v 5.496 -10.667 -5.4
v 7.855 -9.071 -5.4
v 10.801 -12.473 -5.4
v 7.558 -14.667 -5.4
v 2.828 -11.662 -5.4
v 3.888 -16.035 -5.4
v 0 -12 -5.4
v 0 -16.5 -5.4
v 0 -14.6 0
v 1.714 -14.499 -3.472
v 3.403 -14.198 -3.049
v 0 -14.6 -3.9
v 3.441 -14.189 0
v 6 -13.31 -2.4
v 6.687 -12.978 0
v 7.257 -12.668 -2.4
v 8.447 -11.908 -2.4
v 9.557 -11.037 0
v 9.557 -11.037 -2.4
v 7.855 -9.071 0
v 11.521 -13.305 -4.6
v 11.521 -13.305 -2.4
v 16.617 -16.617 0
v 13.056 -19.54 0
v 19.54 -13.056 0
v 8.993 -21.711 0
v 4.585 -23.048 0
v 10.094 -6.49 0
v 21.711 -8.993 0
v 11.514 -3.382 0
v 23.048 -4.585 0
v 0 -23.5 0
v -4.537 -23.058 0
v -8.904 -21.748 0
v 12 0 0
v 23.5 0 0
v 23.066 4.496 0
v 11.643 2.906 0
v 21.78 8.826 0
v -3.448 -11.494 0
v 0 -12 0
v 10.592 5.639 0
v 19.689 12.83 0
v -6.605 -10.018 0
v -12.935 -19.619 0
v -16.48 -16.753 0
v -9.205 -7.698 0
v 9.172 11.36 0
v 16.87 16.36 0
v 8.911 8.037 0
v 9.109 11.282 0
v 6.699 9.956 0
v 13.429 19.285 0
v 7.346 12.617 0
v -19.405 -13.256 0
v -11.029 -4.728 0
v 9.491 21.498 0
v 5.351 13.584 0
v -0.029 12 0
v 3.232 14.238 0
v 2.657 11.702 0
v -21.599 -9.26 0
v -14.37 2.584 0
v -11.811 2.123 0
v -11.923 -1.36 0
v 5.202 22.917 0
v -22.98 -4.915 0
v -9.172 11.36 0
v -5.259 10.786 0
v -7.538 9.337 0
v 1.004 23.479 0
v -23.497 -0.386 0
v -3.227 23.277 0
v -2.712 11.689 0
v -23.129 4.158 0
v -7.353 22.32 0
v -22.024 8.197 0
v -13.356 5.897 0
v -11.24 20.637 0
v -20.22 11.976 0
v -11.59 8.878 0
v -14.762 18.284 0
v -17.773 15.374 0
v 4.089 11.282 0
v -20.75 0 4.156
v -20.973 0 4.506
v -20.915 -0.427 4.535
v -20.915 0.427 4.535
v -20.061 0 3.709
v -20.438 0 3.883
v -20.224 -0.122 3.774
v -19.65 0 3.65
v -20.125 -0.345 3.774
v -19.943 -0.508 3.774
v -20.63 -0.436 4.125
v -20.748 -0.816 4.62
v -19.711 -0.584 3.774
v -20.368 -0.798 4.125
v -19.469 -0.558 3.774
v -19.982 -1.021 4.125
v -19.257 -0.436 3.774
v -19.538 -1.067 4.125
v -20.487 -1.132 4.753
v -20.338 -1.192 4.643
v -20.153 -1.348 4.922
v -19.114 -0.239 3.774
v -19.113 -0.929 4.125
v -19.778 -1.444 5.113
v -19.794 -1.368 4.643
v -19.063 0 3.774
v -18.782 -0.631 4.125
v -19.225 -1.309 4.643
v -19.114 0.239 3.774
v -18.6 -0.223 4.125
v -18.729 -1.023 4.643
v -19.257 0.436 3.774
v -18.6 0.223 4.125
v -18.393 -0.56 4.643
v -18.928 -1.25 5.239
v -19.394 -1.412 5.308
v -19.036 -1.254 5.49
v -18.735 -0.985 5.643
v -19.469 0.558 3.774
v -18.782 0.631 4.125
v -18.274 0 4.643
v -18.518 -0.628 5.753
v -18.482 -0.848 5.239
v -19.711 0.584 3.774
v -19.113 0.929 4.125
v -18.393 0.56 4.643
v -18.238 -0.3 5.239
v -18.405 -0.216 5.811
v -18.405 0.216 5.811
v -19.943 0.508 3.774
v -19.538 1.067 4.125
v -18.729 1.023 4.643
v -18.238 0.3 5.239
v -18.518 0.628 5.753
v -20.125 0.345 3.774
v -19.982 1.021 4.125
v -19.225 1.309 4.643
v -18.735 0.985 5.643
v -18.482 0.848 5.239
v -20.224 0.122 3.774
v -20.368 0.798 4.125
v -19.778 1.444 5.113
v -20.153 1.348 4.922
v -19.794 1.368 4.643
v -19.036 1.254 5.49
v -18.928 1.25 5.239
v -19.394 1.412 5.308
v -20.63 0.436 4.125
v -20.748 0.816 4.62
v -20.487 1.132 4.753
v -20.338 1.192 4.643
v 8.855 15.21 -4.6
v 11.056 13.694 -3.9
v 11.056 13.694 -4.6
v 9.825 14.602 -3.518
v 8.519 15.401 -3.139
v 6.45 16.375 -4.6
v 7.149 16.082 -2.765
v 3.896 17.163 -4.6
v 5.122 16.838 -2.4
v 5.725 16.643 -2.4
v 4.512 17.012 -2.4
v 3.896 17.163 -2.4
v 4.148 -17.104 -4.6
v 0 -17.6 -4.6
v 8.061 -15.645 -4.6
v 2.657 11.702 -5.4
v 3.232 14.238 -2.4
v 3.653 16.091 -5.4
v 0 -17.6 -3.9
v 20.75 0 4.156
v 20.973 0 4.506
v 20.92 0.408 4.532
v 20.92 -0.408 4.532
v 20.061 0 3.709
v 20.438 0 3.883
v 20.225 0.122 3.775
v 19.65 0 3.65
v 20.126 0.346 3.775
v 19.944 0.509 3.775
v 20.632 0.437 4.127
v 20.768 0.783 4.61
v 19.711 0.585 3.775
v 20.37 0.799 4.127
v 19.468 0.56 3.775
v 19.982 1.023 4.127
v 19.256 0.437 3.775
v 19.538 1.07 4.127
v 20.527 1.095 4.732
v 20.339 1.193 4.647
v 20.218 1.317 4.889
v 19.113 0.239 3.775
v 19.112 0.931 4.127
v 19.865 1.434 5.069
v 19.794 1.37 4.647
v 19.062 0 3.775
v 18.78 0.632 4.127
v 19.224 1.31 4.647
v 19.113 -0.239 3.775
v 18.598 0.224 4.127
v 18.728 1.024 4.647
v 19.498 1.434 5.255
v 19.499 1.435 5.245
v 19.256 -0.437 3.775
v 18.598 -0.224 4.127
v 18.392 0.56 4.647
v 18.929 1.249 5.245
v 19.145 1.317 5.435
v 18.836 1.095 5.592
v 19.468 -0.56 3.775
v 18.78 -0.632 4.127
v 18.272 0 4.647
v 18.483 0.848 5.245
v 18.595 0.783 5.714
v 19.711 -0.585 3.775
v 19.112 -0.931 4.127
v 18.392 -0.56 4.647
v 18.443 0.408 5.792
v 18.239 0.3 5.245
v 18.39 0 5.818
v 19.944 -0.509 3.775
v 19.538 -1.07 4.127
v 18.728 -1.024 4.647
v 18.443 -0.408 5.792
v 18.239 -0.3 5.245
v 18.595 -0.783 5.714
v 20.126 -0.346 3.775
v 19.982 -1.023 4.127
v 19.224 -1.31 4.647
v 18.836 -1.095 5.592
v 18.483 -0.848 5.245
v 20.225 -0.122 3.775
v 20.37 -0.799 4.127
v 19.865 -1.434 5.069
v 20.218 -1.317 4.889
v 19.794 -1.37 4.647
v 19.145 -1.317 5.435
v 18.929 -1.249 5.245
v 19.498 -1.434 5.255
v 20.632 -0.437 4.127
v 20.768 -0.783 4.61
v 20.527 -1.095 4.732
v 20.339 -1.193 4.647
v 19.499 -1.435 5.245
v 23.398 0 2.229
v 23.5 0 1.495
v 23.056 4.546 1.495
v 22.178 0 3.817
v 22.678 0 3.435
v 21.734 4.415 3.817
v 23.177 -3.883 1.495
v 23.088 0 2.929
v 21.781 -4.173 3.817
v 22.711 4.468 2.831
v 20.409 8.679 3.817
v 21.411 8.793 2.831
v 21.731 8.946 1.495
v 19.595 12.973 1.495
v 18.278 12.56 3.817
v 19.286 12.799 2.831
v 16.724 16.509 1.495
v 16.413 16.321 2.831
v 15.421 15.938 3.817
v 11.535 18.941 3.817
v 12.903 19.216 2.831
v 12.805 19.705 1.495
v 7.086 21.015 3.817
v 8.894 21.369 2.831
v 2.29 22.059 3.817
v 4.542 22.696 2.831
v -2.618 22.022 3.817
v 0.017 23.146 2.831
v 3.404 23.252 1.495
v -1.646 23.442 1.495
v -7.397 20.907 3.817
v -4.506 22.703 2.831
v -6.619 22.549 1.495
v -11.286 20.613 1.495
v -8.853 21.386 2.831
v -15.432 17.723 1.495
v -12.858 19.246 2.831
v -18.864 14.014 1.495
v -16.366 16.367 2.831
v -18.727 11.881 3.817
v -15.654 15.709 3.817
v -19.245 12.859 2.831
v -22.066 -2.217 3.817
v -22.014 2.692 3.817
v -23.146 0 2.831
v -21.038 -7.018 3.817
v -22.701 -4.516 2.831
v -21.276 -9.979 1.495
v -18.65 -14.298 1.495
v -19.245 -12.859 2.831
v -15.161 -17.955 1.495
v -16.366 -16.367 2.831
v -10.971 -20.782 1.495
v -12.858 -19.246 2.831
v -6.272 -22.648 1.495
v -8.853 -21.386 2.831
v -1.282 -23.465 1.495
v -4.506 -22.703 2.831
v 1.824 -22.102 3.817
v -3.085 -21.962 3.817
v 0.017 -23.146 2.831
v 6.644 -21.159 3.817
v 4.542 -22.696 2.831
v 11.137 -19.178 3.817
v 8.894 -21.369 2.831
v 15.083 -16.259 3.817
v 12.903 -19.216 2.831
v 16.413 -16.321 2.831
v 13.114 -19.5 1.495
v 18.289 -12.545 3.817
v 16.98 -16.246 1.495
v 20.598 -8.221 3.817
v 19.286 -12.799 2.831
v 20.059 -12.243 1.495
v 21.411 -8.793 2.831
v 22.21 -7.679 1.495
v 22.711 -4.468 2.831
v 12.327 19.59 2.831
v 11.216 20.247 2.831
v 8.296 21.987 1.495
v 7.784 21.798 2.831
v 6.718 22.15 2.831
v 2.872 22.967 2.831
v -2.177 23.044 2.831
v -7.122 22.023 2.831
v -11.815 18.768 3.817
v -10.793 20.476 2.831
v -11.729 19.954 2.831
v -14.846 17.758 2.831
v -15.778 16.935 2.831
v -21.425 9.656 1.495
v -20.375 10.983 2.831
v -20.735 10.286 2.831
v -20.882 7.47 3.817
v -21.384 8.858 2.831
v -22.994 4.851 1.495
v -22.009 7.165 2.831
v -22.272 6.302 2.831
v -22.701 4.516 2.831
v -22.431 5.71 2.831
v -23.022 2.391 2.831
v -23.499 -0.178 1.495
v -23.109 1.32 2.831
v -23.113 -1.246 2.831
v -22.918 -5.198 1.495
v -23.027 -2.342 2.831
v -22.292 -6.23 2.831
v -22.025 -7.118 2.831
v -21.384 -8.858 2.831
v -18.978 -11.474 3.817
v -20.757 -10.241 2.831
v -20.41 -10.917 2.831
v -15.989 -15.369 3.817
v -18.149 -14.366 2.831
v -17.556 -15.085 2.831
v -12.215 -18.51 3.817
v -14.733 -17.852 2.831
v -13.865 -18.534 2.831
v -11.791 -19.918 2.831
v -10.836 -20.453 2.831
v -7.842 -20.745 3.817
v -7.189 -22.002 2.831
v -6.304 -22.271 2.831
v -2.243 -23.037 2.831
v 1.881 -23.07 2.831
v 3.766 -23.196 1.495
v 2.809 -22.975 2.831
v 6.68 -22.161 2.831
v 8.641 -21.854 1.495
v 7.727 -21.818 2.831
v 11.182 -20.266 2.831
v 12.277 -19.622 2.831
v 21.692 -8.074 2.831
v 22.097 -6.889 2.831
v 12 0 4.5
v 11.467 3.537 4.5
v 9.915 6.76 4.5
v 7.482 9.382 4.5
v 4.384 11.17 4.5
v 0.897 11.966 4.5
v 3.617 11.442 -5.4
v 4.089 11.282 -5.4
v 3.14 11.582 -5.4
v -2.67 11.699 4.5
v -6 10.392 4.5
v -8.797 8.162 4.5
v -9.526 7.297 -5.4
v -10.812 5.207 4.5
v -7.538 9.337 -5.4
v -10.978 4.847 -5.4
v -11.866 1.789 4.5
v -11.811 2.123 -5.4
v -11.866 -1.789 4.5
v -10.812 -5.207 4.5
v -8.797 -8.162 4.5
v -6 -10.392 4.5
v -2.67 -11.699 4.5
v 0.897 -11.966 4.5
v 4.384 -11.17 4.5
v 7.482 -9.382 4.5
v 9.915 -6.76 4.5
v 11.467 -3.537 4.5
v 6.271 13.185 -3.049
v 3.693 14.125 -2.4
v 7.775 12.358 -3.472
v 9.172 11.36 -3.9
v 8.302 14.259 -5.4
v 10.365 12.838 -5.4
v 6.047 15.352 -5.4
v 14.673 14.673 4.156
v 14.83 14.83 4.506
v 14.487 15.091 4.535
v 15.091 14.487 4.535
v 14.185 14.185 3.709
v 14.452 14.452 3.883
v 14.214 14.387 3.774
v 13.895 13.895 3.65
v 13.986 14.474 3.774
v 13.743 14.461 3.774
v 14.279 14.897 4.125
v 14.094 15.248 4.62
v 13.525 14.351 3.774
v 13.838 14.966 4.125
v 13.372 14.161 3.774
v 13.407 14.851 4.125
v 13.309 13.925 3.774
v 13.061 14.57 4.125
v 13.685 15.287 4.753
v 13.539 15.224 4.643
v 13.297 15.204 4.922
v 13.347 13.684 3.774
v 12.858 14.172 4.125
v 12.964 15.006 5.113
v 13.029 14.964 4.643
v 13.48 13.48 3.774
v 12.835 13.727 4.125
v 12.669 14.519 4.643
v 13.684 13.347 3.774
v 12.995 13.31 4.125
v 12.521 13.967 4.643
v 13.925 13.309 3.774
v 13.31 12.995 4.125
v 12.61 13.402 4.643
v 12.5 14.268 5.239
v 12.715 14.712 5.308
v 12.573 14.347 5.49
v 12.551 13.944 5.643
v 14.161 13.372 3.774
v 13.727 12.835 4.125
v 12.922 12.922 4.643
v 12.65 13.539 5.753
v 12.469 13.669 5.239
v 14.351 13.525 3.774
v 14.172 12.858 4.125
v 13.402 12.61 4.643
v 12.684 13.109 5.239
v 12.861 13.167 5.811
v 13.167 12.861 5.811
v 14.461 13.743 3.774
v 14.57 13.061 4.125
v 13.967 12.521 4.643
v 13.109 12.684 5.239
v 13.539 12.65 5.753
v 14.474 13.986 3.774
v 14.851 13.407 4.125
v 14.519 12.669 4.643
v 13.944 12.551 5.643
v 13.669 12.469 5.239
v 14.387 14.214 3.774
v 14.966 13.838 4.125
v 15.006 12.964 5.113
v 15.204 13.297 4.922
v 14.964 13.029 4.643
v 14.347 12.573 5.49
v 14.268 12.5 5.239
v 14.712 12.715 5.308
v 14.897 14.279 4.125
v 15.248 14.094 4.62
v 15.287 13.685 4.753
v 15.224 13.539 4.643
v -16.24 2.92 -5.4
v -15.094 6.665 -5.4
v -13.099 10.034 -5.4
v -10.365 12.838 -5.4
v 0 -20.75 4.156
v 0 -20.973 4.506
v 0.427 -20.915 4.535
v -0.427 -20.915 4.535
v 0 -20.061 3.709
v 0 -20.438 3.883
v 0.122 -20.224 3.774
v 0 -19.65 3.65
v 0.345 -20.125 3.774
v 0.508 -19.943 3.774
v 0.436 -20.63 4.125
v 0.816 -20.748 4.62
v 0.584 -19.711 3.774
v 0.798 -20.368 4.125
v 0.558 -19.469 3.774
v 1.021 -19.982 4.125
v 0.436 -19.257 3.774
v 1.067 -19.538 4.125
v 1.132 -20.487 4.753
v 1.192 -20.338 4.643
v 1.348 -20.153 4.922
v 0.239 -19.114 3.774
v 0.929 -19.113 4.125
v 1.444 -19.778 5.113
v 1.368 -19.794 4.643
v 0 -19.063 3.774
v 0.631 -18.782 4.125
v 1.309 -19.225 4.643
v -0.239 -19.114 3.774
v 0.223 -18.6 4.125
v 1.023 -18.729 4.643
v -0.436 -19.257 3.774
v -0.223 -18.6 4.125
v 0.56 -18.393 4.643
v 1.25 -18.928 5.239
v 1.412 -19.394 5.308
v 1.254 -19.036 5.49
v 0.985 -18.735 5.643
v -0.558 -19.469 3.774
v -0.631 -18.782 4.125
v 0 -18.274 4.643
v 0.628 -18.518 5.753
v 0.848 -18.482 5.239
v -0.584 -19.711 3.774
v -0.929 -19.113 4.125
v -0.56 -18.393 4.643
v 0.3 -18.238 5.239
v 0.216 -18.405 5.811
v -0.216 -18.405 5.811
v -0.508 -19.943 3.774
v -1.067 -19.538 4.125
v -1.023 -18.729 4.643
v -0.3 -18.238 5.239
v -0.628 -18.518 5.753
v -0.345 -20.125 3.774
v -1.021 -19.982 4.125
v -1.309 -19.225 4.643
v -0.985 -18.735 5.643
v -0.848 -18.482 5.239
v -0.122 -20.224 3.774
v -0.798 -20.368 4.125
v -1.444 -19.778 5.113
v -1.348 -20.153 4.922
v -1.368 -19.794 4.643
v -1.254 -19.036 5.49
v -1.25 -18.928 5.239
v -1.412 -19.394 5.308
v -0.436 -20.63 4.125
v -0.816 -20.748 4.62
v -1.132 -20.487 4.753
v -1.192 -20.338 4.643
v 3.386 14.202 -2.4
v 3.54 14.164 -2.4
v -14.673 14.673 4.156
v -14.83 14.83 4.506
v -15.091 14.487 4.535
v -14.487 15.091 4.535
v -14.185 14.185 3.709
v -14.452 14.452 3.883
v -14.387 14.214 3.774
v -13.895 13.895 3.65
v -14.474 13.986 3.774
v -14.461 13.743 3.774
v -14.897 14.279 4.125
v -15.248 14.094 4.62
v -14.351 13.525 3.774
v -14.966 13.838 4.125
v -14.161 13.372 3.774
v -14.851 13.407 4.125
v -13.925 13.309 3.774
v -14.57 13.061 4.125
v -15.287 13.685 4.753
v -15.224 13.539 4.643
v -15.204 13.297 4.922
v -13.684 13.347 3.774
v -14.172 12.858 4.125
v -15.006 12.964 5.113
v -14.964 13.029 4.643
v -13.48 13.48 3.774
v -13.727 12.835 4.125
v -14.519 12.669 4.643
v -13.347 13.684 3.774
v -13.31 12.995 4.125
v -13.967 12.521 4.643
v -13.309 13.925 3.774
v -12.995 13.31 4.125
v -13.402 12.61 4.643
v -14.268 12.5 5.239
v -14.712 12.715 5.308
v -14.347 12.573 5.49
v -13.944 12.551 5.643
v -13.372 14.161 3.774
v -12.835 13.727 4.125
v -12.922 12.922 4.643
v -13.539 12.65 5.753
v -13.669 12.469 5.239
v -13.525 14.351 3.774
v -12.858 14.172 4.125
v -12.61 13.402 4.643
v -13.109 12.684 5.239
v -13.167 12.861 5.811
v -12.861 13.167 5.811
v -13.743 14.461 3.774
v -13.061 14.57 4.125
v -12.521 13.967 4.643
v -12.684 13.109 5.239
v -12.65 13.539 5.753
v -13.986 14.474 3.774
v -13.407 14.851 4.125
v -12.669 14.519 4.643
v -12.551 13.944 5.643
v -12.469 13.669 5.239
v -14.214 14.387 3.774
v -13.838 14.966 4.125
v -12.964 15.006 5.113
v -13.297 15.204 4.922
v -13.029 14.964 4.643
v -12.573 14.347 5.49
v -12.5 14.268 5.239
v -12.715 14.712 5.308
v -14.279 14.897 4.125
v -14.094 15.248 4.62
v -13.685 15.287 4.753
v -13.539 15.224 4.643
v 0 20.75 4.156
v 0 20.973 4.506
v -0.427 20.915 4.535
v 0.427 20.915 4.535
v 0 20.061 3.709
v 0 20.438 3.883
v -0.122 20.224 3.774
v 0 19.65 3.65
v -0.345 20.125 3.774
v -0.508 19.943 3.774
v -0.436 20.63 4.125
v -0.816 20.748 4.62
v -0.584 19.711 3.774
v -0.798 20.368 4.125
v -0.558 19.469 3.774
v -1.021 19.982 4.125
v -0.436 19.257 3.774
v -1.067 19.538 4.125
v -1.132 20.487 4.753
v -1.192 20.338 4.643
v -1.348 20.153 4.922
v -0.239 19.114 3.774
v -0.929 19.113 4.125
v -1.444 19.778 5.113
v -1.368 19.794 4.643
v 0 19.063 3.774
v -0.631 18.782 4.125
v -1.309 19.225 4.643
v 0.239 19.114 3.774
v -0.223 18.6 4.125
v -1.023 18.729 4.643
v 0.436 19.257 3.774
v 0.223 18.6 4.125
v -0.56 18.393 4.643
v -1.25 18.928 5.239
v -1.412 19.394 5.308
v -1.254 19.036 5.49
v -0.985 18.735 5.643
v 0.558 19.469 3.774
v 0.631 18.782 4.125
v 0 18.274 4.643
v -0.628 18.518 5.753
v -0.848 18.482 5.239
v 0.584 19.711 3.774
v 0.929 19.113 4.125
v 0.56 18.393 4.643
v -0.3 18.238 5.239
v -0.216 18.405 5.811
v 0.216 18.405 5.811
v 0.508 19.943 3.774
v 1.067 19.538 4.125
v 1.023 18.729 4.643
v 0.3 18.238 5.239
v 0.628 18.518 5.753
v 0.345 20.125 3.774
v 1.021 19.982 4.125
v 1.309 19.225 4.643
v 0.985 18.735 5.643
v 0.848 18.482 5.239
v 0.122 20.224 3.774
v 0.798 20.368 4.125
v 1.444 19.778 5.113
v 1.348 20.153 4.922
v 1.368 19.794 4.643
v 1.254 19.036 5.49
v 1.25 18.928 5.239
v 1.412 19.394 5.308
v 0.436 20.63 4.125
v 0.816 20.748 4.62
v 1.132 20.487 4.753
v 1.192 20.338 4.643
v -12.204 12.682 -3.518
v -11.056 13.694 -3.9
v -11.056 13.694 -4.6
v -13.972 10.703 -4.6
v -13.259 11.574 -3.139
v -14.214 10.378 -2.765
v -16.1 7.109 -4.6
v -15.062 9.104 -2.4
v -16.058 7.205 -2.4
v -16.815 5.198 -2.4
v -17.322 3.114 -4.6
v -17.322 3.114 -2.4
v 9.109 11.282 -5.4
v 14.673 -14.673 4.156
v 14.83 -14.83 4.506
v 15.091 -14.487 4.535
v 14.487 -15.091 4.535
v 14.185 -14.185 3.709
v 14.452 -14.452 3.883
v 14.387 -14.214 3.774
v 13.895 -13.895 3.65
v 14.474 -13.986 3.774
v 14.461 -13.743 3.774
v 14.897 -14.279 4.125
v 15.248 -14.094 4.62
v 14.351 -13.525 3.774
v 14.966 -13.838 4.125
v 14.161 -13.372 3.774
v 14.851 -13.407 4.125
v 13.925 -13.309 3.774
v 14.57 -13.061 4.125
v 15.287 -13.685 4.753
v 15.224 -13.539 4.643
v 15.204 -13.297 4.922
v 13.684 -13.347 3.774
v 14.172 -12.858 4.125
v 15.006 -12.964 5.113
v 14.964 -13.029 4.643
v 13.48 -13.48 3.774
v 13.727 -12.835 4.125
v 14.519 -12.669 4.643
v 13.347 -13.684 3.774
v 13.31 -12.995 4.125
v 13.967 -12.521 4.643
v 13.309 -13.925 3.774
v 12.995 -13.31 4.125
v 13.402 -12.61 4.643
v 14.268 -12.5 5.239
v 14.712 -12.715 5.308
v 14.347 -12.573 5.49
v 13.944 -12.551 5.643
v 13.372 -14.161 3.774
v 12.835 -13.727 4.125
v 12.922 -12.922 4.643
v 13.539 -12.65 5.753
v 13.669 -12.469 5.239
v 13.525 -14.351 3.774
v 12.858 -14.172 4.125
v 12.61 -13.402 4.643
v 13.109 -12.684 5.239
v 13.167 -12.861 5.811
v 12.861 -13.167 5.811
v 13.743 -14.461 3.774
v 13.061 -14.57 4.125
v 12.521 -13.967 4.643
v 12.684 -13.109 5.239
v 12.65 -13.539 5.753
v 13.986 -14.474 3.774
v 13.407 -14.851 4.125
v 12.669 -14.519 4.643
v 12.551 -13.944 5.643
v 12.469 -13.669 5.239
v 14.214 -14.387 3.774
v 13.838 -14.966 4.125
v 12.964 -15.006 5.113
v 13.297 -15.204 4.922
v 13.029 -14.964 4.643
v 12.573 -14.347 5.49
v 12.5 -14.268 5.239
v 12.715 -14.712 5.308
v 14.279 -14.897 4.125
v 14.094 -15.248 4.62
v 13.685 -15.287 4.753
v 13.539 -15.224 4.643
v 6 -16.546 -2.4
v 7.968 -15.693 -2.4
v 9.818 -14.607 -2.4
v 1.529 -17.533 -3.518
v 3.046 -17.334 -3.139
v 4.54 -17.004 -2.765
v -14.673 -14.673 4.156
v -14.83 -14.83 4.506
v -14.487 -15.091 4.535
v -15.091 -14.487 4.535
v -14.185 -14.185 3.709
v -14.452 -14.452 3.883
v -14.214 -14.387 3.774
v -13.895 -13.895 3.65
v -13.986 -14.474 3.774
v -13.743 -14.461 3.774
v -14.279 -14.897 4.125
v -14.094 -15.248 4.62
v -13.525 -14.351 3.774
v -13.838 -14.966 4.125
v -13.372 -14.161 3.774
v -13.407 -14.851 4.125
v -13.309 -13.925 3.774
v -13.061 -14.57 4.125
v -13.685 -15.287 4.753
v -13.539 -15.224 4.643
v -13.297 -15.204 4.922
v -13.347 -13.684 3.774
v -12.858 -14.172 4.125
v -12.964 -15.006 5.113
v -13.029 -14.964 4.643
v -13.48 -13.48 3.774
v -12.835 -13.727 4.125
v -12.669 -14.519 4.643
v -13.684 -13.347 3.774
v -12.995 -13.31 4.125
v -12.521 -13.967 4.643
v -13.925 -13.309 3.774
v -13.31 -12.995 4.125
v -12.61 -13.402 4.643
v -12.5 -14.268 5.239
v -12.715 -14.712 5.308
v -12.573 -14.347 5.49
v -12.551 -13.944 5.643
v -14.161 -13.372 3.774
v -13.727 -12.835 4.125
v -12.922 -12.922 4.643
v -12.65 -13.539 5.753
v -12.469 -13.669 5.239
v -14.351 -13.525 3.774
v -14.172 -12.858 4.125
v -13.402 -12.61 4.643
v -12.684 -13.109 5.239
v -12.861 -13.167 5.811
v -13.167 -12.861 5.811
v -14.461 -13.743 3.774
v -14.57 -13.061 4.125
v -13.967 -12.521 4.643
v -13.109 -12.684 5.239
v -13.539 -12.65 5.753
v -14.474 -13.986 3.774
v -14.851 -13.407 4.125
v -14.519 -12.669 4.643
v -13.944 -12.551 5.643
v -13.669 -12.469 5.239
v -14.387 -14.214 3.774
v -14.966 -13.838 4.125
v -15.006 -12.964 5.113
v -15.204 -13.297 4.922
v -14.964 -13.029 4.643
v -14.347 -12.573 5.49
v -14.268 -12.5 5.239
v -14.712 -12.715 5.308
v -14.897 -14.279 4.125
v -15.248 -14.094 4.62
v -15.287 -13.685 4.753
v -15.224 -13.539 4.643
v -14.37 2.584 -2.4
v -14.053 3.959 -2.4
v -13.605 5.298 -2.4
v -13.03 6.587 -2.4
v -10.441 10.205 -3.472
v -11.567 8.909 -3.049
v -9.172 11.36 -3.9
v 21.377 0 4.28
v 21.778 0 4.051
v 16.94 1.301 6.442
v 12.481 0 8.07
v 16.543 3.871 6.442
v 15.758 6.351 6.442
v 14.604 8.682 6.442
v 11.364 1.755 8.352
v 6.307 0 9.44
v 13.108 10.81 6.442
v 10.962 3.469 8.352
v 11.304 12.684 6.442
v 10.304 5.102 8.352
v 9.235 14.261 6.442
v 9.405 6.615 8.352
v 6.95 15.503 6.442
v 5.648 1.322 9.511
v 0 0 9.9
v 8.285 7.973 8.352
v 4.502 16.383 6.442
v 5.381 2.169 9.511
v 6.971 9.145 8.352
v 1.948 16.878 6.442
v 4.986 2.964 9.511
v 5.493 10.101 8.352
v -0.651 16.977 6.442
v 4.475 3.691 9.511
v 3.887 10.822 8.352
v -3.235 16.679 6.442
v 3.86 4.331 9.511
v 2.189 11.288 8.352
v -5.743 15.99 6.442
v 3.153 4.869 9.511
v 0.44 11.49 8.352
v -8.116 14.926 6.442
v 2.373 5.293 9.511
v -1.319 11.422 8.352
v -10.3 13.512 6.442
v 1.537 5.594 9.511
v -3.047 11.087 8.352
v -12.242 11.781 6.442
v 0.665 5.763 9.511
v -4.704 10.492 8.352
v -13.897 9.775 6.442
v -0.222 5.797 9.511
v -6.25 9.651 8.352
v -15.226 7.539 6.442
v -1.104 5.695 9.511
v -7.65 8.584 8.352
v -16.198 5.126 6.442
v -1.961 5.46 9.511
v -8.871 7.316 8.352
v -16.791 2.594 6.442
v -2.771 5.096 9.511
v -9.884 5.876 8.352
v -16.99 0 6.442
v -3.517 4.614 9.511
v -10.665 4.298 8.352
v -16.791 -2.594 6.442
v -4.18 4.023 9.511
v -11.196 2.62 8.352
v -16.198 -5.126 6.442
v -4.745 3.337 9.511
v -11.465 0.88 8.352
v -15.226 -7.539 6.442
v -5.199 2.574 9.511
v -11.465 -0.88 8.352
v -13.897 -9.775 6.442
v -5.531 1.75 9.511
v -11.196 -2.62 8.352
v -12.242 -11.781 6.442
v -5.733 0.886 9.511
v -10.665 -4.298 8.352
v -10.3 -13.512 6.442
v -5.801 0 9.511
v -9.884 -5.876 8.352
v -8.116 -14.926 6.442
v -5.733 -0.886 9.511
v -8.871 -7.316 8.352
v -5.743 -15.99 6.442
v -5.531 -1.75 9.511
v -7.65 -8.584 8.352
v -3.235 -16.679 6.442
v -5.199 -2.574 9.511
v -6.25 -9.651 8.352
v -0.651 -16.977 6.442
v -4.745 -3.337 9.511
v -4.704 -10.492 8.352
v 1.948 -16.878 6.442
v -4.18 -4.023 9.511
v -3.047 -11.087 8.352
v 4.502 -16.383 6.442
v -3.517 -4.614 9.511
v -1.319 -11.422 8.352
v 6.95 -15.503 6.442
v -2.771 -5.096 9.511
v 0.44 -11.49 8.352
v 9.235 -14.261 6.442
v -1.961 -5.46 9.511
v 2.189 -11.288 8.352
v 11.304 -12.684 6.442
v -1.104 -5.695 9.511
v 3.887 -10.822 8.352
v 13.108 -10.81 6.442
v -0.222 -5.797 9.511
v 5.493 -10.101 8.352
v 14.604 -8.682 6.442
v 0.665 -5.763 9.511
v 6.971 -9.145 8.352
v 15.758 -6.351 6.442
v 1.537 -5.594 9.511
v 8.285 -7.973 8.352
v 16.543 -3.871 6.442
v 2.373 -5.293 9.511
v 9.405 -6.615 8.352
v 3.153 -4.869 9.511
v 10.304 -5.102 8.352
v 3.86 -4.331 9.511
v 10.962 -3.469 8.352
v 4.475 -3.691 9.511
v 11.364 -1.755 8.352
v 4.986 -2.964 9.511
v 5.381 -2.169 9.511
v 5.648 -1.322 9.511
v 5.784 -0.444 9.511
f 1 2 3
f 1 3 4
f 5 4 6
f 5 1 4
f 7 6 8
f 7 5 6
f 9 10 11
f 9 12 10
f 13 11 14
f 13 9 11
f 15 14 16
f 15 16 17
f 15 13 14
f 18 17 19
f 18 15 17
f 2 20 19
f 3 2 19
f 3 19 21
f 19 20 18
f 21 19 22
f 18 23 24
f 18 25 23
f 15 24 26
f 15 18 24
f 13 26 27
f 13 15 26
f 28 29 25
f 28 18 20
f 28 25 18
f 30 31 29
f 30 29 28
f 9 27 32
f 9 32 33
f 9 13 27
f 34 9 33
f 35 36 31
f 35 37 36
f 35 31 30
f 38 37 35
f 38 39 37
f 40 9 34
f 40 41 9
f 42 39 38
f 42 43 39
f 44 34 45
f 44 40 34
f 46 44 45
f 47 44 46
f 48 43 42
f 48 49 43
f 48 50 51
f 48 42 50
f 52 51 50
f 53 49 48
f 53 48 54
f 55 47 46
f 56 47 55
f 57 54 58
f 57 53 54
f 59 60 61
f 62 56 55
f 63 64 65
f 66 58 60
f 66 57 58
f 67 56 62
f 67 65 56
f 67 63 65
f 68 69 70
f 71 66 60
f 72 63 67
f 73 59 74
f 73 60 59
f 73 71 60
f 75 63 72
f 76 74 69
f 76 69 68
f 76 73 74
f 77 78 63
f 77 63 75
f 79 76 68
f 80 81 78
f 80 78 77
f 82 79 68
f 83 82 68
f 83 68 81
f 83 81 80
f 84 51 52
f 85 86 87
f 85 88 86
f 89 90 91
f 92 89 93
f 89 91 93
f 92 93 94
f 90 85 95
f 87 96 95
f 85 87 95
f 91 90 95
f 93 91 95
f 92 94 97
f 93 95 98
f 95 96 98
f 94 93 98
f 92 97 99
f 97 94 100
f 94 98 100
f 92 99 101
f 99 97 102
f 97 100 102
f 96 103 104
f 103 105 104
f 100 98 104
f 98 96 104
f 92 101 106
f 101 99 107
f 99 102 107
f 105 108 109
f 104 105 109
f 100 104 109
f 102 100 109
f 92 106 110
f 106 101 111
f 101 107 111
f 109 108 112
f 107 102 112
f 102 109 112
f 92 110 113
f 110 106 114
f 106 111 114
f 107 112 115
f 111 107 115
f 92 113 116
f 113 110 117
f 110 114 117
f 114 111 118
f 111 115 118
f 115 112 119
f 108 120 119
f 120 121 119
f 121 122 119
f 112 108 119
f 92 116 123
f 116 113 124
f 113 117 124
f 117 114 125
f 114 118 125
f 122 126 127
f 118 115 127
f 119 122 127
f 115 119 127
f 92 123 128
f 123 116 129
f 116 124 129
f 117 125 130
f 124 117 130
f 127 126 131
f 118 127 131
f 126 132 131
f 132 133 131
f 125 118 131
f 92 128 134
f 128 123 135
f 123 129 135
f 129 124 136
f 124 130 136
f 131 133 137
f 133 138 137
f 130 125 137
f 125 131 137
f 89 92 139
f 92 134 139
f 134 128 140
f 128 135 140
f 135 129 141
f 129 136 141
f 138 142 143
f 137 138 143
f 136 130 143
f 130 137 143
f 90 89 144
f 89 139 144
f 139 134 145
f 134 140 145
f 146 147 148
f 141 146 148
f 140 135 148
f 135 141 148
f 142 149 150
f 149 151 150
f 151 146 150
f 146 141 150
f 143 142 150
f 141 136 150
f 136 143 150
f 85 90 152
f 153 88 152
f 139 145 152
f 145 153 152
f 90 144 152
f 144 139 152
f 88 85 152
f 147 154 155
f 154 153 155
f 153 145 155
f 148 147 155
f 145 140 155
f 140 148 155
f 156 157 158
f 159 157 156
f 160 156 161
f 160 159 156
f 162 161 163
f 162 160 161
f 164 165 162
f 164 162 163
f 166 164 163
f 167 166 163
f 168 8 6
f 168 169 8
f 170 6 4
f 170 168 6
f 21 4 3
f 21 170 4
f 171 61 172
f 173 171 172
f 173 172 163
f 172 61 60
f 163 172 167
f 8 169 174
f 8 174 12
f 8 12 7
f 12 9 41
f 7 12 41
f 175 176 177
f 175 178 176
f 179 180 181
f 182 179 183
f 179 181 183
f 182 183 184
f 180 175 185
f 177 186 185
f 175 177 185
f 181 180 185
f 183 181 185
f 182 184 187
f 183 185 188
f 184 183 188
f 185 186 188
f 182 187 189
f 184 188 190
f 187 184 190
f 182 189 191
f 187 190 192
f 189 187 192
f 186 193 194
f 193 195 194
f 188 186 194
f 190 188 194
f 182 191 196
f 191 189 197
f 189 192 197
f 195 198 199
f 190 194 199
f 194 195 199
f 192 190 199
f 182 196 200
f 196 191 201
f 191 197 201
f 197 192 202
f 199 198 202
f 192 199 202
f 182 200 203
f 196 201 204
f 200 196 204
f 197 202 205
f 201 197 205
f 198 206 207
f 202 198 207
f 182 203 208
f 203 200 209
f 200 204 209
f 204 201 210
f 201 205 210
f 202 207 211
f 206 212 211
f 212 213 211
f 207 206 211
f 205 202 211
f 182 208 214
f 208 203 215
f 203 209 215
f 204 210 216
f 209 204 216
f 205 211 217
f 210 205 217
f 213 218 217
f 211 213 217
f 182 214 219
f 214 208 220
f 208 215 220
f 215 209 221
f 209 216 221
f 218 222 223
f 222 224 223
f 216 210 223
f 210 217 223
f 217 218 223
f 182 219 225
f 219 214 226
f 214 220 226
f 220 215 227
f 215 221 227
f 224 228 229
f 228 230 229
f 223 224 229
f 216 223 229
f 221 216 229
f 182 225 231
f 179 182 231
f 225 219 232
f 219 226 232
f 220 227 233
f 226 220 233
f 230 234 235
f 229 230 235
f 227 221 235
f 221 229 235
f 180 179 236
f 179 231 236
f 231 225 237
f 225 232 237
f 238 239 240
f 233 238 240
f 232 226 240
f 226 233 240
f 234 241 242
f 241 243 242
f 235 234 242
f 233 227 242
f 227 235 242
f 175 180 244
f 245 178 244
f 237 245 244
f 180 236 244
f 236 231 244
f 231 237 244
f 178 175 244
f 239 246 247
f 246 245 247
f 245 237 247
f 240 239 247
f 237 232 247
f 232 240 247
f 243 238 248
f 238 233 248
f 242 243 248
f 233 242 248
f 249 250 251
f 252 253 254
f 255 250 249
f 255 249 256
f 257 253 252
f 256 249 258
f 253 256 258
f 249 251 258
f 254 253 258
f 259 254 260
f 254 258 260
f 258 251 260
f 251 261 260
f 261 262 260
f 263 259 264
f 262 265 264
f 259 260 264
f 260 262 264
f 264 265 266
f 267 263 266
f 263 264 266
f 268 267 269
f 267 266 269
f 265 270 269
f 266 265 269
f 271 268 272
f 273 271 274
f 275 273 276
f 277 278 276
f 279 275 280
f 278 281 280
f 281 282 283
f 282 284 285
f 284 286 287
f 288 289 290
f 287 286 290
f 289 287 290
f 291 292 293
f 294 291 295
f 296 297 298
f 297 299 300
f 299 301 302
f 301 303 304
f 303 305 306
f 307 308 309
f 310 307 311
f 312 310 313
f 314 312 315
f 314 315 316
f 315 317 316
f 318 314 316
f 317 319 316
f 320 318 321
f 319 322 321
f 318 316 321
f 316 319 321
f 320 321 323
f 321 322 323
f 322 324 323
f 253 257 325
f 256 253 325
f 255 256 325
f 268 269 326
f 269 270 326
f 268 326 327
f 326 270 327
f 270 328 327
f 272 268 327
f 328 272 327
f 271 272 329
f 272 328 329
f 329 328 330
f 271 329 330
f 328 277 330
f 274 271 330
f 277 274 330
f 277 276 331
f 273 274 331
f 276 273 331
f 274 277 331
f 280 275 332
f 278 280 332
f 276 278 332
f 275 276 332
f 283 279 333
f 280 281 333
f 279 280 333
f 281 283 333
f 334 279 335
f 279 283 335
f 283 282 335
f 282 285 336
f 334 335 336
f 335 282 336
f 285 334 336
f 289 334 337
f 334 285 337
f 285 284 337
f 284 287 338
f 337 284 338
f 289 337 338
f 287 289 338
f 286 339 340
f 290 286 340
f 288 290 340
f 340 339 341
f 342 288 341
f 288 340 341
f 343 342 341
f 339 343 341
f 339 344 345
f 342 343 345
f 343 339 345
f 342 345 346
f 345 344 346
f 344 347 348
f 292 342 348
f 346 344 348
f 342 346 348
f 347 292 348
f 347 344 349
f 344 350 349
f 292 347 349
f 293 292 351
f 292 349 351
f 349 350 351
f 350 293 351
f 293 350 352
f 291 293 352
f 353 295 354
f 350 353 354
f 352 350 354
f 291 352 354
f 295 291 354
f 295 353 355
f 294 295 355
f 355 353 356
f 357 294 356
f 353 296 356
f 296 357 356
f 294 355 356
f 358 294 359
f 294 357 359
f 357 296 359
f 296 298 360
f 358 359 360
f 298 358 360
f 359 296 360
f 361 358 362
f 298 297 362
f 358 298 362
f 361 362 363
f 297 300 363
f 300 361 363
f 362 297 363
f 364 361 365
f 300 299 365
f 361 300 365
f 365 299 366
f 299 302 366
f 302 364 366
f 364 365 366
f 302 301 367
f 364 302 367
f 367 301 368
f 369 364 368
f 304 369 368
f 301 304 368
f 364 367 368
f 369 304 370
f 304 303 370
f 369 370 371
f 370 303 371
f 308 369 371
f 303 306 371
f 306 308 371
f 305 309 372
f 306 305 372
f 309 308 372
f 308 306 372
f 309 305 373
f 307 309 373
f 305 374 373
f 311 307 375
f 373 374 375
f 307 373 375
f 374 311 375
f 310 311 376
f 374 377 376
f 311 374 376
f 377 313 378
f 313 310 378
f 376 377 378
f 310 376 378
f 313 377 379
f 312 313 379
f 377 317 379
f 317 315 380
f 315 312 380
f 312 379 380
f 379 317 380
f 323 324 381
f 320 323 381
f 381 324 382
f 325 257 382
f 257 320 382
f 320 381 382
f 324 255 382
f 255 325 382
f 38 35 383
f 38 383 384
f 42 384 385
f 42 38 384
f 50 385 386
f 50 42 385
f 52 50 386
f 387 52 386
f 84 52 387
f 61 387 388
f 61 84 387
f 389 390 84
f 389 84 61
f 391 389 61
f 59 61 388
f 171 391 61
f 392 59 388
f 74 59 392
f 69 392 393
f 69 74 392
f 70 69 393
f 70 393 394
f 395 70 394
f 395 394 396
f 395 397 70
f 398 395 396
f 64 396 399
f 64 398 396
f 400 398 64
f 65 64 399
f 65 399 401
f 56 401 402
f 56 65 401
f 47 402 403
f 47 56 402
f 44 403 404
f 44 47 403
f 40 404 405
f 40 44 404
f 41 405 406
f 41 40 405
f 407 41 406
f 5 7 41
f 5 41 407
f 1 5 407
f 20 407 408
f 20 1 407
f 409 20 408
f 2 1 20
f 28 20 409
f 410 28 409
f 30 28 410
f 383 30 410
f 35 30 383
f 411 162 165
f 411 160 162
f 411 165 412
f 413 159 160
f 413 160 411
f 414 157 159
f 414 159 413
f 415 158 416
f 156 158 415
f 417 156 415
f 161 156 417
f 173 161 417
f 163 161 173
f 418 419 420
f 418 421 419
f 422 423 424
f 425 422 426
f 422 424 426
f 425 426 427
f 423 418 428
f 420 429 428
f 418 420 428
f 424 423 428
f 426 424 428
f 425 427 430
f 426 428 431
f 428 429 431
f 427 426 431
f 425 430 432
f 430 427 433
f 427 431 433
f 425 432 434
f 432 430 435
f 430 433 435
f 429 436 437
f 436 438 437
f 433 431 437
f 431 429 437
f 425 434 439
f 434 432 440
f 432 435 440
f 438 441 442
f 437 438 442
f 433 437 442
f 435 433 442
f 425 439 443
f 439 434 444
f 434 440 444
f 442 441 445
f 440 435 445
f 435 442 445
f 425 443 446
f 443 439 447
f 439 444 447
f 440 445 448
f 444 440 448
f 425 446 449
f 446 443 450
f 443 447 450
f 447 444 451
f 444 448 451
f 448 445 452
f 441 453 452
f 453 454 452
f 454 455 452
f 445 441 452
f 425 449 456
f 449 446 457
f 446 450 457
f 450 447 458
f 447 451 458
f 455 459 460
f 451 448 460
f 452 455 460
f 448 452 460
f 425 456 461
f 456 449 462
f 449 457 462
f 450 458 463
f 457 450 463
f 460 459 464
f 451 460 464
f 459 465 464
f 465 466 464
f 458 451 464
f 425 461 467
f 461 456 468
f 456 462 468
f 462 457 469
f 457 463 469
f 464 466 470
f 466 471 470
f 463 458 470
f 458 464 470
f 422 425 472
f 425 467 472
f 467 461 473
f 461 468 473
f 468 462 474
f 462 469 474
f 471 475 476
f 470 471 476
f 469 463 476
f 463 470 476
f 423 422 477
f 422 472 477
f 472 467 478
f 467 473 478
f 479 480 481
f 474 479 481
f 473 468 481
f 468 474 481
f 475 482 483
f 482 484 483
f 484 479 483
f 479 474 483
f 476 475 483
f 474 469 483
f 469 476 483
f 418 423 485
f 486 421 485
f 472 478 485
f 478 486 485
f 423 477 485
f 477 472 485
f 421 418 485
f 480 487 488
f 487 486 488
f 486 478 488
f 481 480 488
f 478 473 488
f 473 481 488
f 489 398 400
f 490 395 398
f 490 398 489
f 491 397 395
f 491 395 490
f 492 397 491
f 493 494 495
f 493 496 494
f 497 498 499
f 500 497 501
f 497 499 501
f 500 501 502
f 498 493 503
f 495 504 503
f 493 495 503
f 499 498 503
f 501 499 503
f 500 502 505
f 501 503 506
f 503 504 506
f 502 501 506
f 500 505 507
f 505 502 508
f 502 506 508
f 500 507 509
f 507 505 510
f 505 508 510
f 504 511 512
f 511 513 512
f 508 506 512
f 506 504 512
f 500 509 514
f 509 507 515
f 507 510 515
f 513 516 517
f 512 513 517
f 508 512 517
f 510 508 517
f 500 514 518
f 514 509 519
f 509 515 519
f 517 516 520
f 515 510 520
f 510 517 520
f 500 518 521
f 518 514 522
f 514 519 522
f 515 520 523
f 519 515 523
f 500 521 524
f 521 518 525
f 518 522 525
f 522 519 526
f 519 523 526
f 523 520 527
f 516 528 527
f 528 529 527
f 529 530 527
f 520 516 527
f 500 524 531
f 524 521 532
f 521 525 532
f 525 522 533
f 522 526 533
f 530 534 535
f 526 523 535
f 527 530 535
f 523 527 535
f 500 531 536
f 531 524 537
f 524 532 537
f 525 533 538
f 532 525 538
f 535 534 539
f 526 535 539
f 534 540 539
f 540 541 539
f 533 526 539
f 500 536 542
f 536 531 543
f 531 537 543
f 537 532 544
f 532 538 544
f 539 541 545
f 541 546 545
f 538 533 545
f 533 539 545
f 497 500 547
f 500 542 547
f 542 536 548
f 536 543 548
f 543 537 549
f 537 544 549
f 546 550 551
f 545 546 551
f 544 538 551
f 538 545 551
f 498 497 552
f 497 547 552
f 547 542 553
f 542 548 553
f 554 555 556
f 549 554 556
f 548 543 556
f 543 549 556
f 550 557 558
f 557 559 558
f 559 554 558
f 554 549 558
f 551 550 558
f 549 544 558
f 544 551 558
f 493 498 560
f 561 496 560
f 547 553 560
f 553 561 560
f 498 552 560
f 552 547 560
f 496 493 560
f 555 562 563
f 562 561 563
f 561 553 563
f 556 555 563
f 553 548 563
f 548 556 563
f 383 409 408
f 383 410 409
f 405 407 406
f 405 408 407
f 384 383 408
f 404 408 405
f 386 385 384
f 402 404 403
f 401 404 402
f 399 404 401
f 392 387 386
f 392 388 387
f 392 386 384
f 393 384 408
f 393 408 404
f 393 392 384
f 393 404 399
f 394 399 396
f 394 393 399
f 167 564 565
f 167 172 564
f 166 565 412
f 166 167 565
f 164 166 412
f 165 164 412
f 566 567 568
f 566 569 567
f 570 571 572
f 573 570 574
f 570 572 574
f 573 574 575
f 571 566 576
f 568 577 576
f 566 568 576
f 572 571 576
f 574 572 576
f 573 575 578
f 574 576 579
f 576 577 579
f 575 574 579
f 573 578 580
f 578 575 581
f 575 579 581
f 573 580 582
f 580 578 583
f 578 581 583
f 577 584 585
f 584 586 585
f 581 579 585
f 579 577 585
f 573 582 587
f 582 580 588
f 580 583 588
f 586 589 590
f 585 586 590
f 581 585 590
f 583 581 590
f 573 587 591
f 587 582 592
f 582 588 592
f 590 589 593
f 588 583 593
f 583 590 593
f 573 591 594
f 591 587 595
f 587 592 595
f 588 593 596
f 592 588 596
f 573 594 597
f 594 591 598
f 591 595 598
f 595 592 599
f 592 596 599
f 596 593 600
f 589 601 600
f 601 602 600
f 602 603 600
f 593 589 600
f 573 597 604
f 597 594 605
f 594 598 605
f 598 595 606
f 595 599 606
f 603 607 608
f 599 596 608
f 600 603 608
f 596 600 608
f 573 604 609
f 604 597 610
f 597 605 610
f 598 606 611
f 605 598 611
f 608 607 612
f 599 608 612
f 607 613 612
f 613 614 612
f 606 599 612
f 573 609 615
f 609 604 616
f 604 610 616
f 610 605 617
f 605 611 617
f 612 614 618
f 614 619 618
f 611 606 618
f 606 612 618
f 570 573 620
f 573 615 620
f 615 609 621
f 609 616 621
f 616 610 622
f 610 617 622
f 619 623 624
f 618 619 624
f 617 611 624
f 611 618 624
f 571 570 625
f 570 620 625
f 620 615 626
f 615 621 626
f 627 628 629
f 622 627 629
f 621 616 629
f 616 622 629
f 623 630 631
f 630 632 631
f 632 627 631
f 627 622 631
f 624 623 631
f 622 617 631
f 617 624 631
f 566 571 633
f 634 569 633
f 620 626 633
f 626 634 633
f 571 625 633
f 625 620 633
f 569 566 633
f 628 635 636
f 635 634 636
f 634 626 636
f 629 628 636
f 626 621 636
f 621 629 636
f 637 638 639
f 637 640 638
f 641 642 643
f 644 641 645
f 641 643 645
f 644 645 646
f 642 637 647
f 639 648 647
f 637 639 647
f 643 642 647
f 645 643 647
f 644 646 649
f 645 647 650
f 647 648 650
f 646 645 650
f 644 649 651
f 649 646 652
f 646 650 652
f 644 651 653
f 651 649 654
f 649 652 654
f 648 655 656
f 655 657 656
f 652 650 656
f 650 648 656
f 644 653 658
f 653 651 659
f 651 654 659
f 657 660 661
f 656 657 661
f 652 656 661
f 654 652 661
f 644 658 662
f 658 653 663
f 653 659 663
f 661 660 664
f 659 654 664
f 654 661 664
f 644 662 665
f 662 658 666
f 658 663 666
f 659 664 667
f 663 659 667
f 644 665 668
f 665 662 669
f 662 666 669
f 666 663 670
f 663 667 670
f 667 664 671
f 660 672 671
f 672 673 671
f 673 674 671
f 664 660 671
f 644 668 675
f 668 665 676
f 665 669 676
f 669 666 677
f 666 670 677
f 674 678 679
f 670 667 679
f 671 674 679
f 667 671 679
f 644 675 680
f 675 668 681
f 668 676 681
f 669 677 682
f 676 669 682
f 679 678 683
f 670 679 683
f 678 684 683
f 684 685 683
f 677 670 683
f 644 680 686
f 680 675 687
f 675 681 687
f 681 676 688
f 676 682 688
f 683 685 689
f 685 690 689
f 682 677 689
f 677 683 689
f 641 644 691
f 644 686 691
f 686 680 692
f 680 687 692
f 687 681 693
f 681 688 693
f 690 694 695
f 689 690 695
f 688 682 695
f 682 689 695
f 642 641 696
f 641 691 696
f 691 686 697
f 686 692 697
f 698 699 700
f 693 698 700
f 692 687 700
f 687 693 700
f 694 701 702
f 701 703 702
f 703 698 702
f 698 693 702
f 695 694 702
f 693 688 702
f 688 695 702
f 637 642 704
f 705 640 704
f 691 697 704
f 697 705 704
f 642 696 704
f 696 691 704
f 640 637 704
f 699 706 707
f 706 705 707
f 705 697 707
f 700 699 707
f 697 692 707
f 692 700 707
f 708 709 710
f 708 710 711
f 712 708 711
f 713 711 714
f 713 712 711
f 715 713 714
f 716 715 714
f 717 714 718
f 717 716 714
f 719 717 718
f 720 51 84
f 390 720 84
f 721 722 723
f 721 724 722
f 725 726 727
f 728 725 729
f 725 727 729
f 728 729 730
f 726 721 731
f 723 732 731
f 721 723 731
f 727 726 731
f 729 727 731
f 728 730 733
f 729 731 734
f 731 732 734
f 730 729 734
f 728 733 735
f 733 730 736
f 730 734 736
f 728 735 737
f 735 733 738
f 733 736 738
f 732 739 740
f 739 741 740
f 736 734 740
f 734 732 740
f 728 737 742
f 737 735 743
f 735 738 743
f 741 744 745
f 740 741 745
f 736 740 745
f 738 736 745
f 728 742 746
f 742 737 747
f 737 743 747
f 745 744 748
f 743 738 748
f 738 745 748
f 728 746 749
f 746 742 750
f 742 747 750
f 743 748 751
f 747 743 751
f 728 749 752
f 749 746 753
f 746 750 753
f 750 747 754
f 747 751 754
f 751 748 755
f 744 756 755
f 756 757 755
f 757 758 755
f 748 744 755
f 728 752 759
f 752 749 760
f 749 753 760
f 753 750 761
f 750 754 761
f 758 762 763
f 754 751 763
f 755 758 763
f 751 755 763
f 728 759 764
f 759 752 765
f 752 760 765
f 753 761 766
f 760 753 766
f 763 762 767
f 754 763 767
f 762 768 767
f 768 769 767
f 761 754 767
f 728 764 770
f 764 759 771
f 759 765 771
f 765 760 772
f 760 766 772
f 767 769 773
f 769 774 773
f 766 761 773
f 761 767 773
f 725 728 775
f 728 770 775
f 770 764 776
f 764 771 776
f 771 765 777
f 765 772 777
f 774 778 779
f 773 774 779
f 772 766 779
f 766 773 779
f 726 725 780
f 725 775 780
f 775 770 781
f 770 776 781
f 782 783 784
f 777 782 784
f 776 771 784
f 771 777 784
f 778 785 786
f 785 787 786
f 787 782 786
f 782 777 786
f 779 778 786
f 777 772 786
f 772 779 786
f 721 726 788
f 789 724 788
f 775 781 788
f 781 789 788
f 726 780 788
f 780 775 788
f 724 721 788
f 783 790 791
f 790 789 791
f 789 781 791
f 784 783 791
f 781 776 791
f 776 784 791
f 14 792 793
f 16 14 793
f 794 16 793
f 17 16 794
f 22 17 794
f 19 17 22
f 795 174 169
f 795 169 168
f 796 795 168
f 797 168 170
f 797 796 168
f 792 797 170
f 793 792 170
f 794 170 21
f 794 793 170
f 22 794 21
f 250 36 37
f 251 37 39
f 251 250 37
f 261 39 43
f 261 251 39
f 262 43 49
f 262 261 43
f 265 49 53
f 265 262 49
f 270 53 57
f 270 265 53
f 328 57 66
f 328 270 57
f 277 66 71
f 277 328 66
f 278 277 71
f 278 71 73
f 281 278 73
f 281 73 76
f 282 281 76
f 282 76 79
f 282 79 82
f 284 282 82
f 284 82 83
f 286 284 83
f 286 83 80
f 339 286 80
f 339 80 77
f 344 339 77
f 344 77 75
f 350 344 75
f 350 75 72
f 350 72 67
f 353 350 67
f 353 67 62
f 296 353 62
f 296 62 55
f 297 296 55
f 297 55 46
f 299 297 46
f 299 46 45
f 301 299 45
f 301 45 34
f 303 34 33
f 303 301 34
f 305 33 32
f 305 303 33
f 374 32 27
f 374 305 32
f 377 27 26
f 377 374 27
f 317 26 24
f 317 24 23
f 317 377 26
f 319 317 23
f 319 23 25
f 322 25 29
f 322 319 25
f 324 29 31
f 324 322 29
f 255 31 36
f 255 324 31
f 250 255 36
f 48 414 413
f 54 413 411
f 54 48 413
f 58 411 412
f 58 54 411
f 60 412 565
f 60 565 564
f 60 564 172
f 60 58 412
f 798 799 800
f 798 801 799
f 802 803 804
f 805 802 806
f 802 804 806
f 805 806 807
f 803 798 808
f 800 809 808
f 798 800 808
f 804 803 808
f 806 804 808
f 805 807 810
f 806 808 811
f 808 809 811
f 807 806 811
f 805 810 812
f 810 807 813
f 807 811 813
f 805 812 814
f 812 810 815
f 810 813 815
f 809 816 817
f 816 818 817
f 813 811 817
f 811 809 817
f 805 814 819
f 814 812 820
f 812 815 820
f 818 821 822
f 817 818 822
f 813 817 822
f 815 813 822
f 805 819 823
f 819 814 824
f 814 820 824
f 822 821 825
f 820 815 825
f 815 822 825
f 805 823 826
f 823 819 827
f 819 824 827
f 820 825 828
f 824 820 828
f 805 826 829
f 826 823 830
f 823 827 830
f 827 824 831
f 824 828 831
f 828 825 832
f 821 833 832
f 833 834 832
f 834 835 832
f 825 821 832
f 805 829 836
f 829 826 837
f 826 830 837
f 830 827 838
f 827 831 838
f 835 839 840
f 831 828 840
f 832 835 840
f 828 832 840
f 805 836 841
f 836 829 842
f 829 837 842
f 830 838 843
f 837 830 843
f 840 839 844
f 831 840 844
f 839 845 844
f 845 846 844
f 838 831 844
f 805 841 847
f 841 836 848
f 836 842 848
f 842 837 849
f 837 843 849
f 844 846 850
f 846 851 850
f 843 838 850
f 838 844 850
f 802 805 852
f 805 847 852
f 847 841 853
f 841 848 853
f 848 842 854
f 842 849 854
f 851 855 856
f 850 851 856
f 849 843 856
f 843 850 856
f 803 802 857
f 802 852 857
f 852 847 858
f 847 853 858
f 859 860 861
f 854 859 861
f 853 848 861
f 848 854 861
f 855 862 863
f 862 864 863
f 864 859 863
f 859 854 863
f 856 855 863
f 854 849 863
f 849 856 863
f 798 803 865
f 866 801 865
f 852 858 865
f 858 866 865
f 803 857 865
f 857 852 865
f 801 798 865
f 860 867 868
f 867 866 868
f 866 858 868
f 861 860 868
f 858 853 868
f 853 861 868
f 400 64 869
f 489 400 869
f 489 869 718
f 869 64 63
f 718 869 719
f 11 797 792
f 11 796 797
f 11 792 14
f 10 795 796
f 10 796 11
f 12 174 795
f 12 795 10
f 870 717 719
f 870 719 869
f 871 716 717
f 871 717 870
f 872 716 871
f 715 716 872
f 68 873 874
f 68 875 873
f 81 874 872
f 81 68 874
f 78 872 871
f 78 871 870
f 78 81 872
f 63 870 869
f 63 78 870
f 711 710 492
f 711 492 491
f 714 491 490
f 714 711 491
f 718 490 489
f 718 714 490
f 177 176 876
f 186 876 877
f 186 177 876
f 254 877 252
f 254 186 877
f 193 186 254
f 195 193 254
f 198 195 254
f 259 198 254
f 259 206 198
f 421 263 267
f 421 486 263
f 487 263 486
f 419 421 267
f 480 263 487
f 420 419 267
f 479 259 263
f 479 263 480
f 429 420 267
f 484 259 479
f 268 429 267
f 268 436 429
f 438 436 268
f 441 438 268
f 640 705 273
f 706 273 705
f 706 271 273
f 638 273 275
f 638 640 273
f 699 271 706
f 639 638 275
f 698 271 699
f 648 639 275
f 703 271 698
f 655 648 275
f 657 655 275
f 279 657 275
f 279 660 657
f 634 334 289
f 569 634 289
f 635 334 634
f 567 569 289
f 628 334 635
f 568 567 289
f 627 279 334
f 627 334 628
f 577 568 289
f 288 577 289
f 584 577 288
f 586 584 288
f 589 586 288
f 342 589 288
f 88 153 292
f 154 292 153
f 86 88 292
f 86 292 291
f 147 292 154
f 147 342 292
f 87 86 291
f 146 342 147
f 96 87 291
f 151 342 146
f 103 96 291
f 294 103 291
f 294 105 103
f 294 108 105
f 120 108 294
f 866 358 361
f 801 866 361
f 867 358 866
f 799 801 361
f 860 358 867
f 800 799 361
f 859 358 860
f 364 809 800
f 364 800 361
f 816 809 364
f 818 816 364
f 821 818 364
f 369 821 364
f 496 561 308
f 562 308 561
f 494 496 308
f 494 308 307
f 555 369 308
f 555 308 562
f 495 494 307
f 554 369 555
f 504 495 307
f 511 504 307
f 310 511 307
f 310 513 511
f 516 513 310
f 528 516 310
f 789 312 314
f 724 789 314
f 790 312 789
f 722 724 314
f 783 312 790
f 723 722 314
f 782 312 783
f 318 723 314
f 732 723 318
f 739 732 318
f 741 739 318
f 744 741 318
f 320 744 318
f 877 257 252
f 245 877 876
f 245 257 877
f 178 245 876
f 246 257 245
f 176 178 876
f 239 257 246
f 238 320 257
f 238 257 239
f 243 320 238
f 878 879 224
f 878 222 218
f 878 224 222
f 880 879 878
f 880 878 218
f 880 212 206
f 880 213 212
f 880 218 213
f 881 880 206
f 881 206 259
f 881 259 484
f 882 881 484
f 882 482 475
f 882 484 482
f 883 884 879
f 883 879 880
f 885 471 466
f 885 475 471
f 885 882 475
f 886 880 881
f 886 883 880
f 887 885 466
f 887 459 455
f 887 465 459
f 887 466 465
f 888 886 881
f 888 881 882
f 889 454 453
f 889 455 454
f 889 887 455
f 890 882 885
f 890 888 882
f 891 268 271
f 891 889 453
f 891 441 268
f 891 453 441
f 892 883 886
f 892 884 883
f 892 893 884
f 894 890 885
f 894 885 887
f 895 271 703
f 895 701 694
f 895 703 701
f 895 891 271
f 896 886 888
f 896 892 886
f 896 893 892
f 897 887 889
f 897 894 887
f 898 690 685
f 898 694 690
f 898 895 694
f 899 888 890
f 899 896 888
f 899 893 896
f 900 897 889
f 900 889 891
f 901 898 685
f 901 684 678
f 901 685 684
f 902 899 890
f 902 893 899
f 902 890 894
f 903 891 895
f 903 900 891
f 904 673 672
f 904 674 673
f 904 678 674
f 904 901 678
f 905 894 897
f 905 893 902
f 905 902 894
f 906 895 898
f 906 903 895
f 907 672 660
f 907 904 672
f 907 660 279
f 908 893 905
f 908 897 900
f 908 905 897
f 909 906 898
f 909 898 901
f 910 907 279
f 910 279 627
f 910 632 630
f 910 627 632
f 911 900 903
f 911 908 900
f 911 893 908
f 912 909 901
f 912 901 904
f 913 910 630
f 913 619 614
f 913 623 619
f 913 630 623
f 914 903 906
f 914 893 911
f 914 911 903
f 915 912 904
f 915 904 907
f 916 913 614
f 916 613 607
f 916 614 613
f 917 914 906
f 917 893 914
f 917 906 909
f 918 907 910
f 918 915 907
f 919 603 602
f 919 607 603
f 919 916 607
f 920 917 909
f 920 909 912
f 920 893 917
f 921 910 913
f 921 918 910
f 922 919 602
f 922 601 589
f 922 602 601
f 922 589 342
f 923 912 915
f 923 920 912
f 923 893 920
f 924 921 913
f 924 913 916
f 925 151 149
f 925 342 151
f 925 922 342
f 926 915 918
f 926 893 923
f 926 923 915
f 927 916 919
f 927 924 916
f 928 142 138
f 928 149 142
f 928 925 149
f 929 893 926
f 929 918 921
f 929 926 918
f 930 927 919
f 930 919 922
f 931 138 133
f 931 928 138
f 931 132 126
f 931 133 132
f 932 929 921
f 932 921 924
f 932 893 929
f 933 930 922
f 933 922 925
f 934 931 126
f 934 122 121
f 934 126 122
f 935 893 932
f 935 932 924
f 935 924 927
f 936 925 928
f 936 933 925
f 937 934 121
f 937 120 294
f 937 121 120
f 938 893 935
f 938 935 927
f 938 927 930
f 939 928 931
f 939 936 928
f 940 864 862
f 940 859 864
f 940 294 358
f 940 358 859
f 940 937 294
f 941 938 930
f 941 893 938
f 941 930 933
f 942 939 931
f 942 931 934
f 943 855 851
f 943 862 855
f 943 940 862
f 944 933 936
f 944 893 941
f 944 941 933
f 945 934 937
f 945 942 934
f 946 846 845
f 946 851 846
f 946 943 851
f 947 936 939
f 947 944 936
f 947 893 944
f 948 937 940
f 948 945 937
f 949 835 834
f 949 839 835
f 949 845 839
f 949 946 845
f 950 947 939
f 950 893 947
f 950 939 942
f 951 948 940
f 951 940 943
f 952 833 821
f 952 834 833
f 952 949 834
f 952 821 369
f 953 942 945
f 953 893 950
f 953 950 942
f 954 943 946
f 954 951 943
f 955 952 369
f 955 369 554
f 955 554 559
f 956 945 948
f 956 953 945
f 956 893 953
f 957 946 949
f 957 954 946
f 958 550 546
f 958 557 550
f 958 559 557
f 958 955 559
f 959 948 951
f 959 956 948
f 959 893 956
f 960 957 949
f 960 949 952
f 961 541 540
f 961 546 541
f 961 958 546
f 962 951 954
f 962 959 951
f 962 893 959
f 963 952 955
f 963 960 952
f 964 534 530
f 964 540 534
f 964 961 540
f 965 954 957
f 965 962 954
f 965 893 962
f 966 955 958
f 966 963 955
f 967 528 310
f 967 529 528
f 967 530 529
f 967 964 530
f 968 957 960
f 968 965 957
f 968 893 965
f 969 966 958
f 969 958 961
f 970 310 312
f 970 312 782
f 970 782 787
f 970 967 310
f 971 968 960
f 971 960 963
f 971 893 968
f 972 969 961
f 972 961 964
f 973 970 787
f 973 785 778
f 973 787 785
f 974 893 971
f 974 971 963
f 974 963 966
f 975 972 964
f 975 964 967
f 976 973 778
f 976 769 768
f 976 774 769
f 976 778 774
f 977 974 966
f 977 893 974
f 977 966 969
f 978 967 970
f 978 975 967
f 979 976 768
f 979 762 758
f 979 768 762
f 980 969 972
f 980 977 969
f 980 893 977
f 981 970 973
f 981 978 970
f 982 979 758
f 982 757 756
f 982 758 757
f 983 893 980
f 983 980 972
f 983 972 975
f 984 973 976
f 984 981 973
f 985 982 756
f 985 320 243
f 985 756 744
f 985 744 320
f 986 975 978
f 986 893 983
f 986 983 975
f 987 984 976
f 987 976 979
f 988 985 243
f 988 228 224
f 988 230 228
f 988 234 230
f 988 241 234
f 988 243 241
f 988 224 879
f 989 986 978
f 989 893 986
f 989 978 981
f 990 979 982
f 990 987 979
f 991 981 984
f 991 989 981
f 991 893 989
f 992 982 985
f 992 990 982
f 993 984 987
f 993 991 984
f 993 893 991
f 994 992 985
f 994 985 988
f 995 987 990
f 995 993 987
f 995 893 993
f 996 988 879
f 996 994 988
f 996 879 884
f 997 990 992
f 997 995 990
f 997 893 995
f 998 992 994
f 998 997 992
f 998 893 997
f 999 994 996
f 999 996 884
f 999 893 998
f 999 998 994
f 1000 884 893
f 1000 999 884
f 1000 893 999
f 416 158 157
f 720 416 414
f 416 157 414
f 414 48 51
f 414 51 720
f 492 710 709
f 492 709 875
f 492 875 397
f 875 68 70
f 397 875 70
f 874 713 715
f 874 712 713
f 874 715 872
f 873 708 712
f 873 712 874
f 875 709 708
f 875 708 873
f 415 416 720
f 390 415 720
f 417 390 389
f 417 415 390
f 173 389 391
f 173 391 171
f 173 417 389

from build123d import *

# Parameters (mm, degrees)
F2_R       = 2.7
F4_DEPTH   = 5.401
F7_COUNT   = 8
F8_SIZE2   = 1.5
F8_SIZE    = 6
F8_2_SIZE2 = 1.5
F8_2_SIZE  = 6
F8_3_SIZE2 = 1.5
F8_3_SIZE  = 6


with BuildPart() as f1:
    # F0 (on Front) → F1 (revolve)
    with BuildSketch(Plane.XZ):
        with BuildLine():
            Line((14.6, -2.4), (14.6, 0))
            Line((14.6, 0), (23.5, 0))
            Line((23.5, 0), (23.5, 3))
            ThreePointArc((23.5, 3), (12.2460197615, 8.1393426661), (0, 9.9))
            Line((0, 9.9), (0, 4.5))
            Line((0, 4.5), (12, 4.5))
            Line((12, 4.5), (12, 0))
            Line((12, 0), (12, -5.4))
            Line((12, -5.4), (16.5, -5.4))
            Line((16.5, -5.4), (17.6, -4.6))
            Line((17.6, -4.6), (17.6, -2.4))
            Line((17.6, -2.4), (14.6, -2.4))
        make_face()
    revolve(axis=Axis((0, 0, 7.2), (0, 0, 1)))

    # F2
    f2_edges = [f1.edges().sort_by_distance(p)[0] for p in [
        (-23.5, 0, 3),
    ]]
    fillet(f2_edges, radius=F2_R)

    # F3 (on Top) → F4 (cut, through all)
    with BuildSketch(Plane.XY):
        with BuildLine():
            Line((0, 0), (15.3835737599, -17.7650121974))
            ThreePointArc((15.3835737599, -17.7650121974), (23.4965124713, 0.4048477334), (14.7624375114, 18.2844315941))
            Line((14.7624375114, 18.2844315941), (9.108738039, 11.281883324))
            Line((9.108738039, 11.281883324), (4.0889006668, 11.281883324))
            Line((4.0889006668, 11.281883324), (0, 0))
        make_face()
        with BuildLine():
            Line((0, -23.5), (0, 0))
            Line((0, 0), (-23.1291397677, 4.1584725089))
            ThreePointArc((-23.1291397677, 4.1584725089), (-18.0273972603, -15.0752428843), (0, -23.5))
        make_face()
        with BuildLine():
            Line((-14.7624375114, 18.2844315941), (0, 0))
            Line((0, 0), (5.2023993918, 22.9169160353))
            ThreePointArc((5.2023993918, 22.9169160353), (-5.3116438356, 22.8918422099), (-14.7624375114, 18.2844315941))
        make_face()
    extrude(amount=-F4_DEPTH, mode=Mode.SUBTRACT)

    # F7: F6 ×8 about axis
    f7_axis = Axis((0, 0, 7.2), (0, 0, 1))


with BuildPart() as f6:
    # F5 (on Front) → F6 (revolve)
    with BuildSketch(Plane.XZ):
        with BuildLine():
            Line((19.65, 6.5500239328), (19.65, 3.6500239328))
            ThreePointArc((19.65, 3.6500239328), (21.1, 5.1000239328), (19.65, 6.5500239328))
        make_face()
    revolve(axis=Axis((19.65, 0, 5.1000239328), (0, 0, 1)))


with BuildPart() as f1_1:
    add(f1.part)
    for i in range(1, F7_COUNT):
        add(f6.part.rotate(f7_axis, i * 360 / F7_COUNT), mode=Mode.SUBTRACT)

    # F7#seed: cut F6
    add(f6.part, mode=Mode.SUBTRACT)

    # F8
    f8_edges = [f1_1.edges().sort_by_distance(p)[0] for p in [
        (-10.11384, 12.526781, -2.4),
    ]]
    f8_side = f1_1.faces().sort_by_distance((-13.599633, 8.054963, -2.4))[0]
    chamfer(f8_edges, length=F8_SIZE, length2=F8_SIZE2, reference=f8_side)

    # F8#2
    f8_2_edges = [f1_1.edges().sort_by_distance(p)[0] for p in [
        (0, -16.1, -2.4),
    ]]
    f8_2_side = f1_1.faces().sort_by_distance((5.521305, -14.810389, -2.4))[0]
    chamfer(f8_2_edges, length=F8_2_SIZE, length2=F8_2_SIZE2, reference=f8_2_side)

    # F8#3
    f8_3_edges = [f1_1.edges().sort_by_distance(p)[0] for p in [
        (10.11384, 12.526781, -2.4),
    ]]
    f8_3_side = f1_1.faces().sort_by_distance((6.980178, 14.404963, -2.4))[0]
    chamfer(f8_3_edges, length=F8_3_SIZE, length2=F8_3_SIZE2, reference=f8_3_side)


solid = f1_1.part
